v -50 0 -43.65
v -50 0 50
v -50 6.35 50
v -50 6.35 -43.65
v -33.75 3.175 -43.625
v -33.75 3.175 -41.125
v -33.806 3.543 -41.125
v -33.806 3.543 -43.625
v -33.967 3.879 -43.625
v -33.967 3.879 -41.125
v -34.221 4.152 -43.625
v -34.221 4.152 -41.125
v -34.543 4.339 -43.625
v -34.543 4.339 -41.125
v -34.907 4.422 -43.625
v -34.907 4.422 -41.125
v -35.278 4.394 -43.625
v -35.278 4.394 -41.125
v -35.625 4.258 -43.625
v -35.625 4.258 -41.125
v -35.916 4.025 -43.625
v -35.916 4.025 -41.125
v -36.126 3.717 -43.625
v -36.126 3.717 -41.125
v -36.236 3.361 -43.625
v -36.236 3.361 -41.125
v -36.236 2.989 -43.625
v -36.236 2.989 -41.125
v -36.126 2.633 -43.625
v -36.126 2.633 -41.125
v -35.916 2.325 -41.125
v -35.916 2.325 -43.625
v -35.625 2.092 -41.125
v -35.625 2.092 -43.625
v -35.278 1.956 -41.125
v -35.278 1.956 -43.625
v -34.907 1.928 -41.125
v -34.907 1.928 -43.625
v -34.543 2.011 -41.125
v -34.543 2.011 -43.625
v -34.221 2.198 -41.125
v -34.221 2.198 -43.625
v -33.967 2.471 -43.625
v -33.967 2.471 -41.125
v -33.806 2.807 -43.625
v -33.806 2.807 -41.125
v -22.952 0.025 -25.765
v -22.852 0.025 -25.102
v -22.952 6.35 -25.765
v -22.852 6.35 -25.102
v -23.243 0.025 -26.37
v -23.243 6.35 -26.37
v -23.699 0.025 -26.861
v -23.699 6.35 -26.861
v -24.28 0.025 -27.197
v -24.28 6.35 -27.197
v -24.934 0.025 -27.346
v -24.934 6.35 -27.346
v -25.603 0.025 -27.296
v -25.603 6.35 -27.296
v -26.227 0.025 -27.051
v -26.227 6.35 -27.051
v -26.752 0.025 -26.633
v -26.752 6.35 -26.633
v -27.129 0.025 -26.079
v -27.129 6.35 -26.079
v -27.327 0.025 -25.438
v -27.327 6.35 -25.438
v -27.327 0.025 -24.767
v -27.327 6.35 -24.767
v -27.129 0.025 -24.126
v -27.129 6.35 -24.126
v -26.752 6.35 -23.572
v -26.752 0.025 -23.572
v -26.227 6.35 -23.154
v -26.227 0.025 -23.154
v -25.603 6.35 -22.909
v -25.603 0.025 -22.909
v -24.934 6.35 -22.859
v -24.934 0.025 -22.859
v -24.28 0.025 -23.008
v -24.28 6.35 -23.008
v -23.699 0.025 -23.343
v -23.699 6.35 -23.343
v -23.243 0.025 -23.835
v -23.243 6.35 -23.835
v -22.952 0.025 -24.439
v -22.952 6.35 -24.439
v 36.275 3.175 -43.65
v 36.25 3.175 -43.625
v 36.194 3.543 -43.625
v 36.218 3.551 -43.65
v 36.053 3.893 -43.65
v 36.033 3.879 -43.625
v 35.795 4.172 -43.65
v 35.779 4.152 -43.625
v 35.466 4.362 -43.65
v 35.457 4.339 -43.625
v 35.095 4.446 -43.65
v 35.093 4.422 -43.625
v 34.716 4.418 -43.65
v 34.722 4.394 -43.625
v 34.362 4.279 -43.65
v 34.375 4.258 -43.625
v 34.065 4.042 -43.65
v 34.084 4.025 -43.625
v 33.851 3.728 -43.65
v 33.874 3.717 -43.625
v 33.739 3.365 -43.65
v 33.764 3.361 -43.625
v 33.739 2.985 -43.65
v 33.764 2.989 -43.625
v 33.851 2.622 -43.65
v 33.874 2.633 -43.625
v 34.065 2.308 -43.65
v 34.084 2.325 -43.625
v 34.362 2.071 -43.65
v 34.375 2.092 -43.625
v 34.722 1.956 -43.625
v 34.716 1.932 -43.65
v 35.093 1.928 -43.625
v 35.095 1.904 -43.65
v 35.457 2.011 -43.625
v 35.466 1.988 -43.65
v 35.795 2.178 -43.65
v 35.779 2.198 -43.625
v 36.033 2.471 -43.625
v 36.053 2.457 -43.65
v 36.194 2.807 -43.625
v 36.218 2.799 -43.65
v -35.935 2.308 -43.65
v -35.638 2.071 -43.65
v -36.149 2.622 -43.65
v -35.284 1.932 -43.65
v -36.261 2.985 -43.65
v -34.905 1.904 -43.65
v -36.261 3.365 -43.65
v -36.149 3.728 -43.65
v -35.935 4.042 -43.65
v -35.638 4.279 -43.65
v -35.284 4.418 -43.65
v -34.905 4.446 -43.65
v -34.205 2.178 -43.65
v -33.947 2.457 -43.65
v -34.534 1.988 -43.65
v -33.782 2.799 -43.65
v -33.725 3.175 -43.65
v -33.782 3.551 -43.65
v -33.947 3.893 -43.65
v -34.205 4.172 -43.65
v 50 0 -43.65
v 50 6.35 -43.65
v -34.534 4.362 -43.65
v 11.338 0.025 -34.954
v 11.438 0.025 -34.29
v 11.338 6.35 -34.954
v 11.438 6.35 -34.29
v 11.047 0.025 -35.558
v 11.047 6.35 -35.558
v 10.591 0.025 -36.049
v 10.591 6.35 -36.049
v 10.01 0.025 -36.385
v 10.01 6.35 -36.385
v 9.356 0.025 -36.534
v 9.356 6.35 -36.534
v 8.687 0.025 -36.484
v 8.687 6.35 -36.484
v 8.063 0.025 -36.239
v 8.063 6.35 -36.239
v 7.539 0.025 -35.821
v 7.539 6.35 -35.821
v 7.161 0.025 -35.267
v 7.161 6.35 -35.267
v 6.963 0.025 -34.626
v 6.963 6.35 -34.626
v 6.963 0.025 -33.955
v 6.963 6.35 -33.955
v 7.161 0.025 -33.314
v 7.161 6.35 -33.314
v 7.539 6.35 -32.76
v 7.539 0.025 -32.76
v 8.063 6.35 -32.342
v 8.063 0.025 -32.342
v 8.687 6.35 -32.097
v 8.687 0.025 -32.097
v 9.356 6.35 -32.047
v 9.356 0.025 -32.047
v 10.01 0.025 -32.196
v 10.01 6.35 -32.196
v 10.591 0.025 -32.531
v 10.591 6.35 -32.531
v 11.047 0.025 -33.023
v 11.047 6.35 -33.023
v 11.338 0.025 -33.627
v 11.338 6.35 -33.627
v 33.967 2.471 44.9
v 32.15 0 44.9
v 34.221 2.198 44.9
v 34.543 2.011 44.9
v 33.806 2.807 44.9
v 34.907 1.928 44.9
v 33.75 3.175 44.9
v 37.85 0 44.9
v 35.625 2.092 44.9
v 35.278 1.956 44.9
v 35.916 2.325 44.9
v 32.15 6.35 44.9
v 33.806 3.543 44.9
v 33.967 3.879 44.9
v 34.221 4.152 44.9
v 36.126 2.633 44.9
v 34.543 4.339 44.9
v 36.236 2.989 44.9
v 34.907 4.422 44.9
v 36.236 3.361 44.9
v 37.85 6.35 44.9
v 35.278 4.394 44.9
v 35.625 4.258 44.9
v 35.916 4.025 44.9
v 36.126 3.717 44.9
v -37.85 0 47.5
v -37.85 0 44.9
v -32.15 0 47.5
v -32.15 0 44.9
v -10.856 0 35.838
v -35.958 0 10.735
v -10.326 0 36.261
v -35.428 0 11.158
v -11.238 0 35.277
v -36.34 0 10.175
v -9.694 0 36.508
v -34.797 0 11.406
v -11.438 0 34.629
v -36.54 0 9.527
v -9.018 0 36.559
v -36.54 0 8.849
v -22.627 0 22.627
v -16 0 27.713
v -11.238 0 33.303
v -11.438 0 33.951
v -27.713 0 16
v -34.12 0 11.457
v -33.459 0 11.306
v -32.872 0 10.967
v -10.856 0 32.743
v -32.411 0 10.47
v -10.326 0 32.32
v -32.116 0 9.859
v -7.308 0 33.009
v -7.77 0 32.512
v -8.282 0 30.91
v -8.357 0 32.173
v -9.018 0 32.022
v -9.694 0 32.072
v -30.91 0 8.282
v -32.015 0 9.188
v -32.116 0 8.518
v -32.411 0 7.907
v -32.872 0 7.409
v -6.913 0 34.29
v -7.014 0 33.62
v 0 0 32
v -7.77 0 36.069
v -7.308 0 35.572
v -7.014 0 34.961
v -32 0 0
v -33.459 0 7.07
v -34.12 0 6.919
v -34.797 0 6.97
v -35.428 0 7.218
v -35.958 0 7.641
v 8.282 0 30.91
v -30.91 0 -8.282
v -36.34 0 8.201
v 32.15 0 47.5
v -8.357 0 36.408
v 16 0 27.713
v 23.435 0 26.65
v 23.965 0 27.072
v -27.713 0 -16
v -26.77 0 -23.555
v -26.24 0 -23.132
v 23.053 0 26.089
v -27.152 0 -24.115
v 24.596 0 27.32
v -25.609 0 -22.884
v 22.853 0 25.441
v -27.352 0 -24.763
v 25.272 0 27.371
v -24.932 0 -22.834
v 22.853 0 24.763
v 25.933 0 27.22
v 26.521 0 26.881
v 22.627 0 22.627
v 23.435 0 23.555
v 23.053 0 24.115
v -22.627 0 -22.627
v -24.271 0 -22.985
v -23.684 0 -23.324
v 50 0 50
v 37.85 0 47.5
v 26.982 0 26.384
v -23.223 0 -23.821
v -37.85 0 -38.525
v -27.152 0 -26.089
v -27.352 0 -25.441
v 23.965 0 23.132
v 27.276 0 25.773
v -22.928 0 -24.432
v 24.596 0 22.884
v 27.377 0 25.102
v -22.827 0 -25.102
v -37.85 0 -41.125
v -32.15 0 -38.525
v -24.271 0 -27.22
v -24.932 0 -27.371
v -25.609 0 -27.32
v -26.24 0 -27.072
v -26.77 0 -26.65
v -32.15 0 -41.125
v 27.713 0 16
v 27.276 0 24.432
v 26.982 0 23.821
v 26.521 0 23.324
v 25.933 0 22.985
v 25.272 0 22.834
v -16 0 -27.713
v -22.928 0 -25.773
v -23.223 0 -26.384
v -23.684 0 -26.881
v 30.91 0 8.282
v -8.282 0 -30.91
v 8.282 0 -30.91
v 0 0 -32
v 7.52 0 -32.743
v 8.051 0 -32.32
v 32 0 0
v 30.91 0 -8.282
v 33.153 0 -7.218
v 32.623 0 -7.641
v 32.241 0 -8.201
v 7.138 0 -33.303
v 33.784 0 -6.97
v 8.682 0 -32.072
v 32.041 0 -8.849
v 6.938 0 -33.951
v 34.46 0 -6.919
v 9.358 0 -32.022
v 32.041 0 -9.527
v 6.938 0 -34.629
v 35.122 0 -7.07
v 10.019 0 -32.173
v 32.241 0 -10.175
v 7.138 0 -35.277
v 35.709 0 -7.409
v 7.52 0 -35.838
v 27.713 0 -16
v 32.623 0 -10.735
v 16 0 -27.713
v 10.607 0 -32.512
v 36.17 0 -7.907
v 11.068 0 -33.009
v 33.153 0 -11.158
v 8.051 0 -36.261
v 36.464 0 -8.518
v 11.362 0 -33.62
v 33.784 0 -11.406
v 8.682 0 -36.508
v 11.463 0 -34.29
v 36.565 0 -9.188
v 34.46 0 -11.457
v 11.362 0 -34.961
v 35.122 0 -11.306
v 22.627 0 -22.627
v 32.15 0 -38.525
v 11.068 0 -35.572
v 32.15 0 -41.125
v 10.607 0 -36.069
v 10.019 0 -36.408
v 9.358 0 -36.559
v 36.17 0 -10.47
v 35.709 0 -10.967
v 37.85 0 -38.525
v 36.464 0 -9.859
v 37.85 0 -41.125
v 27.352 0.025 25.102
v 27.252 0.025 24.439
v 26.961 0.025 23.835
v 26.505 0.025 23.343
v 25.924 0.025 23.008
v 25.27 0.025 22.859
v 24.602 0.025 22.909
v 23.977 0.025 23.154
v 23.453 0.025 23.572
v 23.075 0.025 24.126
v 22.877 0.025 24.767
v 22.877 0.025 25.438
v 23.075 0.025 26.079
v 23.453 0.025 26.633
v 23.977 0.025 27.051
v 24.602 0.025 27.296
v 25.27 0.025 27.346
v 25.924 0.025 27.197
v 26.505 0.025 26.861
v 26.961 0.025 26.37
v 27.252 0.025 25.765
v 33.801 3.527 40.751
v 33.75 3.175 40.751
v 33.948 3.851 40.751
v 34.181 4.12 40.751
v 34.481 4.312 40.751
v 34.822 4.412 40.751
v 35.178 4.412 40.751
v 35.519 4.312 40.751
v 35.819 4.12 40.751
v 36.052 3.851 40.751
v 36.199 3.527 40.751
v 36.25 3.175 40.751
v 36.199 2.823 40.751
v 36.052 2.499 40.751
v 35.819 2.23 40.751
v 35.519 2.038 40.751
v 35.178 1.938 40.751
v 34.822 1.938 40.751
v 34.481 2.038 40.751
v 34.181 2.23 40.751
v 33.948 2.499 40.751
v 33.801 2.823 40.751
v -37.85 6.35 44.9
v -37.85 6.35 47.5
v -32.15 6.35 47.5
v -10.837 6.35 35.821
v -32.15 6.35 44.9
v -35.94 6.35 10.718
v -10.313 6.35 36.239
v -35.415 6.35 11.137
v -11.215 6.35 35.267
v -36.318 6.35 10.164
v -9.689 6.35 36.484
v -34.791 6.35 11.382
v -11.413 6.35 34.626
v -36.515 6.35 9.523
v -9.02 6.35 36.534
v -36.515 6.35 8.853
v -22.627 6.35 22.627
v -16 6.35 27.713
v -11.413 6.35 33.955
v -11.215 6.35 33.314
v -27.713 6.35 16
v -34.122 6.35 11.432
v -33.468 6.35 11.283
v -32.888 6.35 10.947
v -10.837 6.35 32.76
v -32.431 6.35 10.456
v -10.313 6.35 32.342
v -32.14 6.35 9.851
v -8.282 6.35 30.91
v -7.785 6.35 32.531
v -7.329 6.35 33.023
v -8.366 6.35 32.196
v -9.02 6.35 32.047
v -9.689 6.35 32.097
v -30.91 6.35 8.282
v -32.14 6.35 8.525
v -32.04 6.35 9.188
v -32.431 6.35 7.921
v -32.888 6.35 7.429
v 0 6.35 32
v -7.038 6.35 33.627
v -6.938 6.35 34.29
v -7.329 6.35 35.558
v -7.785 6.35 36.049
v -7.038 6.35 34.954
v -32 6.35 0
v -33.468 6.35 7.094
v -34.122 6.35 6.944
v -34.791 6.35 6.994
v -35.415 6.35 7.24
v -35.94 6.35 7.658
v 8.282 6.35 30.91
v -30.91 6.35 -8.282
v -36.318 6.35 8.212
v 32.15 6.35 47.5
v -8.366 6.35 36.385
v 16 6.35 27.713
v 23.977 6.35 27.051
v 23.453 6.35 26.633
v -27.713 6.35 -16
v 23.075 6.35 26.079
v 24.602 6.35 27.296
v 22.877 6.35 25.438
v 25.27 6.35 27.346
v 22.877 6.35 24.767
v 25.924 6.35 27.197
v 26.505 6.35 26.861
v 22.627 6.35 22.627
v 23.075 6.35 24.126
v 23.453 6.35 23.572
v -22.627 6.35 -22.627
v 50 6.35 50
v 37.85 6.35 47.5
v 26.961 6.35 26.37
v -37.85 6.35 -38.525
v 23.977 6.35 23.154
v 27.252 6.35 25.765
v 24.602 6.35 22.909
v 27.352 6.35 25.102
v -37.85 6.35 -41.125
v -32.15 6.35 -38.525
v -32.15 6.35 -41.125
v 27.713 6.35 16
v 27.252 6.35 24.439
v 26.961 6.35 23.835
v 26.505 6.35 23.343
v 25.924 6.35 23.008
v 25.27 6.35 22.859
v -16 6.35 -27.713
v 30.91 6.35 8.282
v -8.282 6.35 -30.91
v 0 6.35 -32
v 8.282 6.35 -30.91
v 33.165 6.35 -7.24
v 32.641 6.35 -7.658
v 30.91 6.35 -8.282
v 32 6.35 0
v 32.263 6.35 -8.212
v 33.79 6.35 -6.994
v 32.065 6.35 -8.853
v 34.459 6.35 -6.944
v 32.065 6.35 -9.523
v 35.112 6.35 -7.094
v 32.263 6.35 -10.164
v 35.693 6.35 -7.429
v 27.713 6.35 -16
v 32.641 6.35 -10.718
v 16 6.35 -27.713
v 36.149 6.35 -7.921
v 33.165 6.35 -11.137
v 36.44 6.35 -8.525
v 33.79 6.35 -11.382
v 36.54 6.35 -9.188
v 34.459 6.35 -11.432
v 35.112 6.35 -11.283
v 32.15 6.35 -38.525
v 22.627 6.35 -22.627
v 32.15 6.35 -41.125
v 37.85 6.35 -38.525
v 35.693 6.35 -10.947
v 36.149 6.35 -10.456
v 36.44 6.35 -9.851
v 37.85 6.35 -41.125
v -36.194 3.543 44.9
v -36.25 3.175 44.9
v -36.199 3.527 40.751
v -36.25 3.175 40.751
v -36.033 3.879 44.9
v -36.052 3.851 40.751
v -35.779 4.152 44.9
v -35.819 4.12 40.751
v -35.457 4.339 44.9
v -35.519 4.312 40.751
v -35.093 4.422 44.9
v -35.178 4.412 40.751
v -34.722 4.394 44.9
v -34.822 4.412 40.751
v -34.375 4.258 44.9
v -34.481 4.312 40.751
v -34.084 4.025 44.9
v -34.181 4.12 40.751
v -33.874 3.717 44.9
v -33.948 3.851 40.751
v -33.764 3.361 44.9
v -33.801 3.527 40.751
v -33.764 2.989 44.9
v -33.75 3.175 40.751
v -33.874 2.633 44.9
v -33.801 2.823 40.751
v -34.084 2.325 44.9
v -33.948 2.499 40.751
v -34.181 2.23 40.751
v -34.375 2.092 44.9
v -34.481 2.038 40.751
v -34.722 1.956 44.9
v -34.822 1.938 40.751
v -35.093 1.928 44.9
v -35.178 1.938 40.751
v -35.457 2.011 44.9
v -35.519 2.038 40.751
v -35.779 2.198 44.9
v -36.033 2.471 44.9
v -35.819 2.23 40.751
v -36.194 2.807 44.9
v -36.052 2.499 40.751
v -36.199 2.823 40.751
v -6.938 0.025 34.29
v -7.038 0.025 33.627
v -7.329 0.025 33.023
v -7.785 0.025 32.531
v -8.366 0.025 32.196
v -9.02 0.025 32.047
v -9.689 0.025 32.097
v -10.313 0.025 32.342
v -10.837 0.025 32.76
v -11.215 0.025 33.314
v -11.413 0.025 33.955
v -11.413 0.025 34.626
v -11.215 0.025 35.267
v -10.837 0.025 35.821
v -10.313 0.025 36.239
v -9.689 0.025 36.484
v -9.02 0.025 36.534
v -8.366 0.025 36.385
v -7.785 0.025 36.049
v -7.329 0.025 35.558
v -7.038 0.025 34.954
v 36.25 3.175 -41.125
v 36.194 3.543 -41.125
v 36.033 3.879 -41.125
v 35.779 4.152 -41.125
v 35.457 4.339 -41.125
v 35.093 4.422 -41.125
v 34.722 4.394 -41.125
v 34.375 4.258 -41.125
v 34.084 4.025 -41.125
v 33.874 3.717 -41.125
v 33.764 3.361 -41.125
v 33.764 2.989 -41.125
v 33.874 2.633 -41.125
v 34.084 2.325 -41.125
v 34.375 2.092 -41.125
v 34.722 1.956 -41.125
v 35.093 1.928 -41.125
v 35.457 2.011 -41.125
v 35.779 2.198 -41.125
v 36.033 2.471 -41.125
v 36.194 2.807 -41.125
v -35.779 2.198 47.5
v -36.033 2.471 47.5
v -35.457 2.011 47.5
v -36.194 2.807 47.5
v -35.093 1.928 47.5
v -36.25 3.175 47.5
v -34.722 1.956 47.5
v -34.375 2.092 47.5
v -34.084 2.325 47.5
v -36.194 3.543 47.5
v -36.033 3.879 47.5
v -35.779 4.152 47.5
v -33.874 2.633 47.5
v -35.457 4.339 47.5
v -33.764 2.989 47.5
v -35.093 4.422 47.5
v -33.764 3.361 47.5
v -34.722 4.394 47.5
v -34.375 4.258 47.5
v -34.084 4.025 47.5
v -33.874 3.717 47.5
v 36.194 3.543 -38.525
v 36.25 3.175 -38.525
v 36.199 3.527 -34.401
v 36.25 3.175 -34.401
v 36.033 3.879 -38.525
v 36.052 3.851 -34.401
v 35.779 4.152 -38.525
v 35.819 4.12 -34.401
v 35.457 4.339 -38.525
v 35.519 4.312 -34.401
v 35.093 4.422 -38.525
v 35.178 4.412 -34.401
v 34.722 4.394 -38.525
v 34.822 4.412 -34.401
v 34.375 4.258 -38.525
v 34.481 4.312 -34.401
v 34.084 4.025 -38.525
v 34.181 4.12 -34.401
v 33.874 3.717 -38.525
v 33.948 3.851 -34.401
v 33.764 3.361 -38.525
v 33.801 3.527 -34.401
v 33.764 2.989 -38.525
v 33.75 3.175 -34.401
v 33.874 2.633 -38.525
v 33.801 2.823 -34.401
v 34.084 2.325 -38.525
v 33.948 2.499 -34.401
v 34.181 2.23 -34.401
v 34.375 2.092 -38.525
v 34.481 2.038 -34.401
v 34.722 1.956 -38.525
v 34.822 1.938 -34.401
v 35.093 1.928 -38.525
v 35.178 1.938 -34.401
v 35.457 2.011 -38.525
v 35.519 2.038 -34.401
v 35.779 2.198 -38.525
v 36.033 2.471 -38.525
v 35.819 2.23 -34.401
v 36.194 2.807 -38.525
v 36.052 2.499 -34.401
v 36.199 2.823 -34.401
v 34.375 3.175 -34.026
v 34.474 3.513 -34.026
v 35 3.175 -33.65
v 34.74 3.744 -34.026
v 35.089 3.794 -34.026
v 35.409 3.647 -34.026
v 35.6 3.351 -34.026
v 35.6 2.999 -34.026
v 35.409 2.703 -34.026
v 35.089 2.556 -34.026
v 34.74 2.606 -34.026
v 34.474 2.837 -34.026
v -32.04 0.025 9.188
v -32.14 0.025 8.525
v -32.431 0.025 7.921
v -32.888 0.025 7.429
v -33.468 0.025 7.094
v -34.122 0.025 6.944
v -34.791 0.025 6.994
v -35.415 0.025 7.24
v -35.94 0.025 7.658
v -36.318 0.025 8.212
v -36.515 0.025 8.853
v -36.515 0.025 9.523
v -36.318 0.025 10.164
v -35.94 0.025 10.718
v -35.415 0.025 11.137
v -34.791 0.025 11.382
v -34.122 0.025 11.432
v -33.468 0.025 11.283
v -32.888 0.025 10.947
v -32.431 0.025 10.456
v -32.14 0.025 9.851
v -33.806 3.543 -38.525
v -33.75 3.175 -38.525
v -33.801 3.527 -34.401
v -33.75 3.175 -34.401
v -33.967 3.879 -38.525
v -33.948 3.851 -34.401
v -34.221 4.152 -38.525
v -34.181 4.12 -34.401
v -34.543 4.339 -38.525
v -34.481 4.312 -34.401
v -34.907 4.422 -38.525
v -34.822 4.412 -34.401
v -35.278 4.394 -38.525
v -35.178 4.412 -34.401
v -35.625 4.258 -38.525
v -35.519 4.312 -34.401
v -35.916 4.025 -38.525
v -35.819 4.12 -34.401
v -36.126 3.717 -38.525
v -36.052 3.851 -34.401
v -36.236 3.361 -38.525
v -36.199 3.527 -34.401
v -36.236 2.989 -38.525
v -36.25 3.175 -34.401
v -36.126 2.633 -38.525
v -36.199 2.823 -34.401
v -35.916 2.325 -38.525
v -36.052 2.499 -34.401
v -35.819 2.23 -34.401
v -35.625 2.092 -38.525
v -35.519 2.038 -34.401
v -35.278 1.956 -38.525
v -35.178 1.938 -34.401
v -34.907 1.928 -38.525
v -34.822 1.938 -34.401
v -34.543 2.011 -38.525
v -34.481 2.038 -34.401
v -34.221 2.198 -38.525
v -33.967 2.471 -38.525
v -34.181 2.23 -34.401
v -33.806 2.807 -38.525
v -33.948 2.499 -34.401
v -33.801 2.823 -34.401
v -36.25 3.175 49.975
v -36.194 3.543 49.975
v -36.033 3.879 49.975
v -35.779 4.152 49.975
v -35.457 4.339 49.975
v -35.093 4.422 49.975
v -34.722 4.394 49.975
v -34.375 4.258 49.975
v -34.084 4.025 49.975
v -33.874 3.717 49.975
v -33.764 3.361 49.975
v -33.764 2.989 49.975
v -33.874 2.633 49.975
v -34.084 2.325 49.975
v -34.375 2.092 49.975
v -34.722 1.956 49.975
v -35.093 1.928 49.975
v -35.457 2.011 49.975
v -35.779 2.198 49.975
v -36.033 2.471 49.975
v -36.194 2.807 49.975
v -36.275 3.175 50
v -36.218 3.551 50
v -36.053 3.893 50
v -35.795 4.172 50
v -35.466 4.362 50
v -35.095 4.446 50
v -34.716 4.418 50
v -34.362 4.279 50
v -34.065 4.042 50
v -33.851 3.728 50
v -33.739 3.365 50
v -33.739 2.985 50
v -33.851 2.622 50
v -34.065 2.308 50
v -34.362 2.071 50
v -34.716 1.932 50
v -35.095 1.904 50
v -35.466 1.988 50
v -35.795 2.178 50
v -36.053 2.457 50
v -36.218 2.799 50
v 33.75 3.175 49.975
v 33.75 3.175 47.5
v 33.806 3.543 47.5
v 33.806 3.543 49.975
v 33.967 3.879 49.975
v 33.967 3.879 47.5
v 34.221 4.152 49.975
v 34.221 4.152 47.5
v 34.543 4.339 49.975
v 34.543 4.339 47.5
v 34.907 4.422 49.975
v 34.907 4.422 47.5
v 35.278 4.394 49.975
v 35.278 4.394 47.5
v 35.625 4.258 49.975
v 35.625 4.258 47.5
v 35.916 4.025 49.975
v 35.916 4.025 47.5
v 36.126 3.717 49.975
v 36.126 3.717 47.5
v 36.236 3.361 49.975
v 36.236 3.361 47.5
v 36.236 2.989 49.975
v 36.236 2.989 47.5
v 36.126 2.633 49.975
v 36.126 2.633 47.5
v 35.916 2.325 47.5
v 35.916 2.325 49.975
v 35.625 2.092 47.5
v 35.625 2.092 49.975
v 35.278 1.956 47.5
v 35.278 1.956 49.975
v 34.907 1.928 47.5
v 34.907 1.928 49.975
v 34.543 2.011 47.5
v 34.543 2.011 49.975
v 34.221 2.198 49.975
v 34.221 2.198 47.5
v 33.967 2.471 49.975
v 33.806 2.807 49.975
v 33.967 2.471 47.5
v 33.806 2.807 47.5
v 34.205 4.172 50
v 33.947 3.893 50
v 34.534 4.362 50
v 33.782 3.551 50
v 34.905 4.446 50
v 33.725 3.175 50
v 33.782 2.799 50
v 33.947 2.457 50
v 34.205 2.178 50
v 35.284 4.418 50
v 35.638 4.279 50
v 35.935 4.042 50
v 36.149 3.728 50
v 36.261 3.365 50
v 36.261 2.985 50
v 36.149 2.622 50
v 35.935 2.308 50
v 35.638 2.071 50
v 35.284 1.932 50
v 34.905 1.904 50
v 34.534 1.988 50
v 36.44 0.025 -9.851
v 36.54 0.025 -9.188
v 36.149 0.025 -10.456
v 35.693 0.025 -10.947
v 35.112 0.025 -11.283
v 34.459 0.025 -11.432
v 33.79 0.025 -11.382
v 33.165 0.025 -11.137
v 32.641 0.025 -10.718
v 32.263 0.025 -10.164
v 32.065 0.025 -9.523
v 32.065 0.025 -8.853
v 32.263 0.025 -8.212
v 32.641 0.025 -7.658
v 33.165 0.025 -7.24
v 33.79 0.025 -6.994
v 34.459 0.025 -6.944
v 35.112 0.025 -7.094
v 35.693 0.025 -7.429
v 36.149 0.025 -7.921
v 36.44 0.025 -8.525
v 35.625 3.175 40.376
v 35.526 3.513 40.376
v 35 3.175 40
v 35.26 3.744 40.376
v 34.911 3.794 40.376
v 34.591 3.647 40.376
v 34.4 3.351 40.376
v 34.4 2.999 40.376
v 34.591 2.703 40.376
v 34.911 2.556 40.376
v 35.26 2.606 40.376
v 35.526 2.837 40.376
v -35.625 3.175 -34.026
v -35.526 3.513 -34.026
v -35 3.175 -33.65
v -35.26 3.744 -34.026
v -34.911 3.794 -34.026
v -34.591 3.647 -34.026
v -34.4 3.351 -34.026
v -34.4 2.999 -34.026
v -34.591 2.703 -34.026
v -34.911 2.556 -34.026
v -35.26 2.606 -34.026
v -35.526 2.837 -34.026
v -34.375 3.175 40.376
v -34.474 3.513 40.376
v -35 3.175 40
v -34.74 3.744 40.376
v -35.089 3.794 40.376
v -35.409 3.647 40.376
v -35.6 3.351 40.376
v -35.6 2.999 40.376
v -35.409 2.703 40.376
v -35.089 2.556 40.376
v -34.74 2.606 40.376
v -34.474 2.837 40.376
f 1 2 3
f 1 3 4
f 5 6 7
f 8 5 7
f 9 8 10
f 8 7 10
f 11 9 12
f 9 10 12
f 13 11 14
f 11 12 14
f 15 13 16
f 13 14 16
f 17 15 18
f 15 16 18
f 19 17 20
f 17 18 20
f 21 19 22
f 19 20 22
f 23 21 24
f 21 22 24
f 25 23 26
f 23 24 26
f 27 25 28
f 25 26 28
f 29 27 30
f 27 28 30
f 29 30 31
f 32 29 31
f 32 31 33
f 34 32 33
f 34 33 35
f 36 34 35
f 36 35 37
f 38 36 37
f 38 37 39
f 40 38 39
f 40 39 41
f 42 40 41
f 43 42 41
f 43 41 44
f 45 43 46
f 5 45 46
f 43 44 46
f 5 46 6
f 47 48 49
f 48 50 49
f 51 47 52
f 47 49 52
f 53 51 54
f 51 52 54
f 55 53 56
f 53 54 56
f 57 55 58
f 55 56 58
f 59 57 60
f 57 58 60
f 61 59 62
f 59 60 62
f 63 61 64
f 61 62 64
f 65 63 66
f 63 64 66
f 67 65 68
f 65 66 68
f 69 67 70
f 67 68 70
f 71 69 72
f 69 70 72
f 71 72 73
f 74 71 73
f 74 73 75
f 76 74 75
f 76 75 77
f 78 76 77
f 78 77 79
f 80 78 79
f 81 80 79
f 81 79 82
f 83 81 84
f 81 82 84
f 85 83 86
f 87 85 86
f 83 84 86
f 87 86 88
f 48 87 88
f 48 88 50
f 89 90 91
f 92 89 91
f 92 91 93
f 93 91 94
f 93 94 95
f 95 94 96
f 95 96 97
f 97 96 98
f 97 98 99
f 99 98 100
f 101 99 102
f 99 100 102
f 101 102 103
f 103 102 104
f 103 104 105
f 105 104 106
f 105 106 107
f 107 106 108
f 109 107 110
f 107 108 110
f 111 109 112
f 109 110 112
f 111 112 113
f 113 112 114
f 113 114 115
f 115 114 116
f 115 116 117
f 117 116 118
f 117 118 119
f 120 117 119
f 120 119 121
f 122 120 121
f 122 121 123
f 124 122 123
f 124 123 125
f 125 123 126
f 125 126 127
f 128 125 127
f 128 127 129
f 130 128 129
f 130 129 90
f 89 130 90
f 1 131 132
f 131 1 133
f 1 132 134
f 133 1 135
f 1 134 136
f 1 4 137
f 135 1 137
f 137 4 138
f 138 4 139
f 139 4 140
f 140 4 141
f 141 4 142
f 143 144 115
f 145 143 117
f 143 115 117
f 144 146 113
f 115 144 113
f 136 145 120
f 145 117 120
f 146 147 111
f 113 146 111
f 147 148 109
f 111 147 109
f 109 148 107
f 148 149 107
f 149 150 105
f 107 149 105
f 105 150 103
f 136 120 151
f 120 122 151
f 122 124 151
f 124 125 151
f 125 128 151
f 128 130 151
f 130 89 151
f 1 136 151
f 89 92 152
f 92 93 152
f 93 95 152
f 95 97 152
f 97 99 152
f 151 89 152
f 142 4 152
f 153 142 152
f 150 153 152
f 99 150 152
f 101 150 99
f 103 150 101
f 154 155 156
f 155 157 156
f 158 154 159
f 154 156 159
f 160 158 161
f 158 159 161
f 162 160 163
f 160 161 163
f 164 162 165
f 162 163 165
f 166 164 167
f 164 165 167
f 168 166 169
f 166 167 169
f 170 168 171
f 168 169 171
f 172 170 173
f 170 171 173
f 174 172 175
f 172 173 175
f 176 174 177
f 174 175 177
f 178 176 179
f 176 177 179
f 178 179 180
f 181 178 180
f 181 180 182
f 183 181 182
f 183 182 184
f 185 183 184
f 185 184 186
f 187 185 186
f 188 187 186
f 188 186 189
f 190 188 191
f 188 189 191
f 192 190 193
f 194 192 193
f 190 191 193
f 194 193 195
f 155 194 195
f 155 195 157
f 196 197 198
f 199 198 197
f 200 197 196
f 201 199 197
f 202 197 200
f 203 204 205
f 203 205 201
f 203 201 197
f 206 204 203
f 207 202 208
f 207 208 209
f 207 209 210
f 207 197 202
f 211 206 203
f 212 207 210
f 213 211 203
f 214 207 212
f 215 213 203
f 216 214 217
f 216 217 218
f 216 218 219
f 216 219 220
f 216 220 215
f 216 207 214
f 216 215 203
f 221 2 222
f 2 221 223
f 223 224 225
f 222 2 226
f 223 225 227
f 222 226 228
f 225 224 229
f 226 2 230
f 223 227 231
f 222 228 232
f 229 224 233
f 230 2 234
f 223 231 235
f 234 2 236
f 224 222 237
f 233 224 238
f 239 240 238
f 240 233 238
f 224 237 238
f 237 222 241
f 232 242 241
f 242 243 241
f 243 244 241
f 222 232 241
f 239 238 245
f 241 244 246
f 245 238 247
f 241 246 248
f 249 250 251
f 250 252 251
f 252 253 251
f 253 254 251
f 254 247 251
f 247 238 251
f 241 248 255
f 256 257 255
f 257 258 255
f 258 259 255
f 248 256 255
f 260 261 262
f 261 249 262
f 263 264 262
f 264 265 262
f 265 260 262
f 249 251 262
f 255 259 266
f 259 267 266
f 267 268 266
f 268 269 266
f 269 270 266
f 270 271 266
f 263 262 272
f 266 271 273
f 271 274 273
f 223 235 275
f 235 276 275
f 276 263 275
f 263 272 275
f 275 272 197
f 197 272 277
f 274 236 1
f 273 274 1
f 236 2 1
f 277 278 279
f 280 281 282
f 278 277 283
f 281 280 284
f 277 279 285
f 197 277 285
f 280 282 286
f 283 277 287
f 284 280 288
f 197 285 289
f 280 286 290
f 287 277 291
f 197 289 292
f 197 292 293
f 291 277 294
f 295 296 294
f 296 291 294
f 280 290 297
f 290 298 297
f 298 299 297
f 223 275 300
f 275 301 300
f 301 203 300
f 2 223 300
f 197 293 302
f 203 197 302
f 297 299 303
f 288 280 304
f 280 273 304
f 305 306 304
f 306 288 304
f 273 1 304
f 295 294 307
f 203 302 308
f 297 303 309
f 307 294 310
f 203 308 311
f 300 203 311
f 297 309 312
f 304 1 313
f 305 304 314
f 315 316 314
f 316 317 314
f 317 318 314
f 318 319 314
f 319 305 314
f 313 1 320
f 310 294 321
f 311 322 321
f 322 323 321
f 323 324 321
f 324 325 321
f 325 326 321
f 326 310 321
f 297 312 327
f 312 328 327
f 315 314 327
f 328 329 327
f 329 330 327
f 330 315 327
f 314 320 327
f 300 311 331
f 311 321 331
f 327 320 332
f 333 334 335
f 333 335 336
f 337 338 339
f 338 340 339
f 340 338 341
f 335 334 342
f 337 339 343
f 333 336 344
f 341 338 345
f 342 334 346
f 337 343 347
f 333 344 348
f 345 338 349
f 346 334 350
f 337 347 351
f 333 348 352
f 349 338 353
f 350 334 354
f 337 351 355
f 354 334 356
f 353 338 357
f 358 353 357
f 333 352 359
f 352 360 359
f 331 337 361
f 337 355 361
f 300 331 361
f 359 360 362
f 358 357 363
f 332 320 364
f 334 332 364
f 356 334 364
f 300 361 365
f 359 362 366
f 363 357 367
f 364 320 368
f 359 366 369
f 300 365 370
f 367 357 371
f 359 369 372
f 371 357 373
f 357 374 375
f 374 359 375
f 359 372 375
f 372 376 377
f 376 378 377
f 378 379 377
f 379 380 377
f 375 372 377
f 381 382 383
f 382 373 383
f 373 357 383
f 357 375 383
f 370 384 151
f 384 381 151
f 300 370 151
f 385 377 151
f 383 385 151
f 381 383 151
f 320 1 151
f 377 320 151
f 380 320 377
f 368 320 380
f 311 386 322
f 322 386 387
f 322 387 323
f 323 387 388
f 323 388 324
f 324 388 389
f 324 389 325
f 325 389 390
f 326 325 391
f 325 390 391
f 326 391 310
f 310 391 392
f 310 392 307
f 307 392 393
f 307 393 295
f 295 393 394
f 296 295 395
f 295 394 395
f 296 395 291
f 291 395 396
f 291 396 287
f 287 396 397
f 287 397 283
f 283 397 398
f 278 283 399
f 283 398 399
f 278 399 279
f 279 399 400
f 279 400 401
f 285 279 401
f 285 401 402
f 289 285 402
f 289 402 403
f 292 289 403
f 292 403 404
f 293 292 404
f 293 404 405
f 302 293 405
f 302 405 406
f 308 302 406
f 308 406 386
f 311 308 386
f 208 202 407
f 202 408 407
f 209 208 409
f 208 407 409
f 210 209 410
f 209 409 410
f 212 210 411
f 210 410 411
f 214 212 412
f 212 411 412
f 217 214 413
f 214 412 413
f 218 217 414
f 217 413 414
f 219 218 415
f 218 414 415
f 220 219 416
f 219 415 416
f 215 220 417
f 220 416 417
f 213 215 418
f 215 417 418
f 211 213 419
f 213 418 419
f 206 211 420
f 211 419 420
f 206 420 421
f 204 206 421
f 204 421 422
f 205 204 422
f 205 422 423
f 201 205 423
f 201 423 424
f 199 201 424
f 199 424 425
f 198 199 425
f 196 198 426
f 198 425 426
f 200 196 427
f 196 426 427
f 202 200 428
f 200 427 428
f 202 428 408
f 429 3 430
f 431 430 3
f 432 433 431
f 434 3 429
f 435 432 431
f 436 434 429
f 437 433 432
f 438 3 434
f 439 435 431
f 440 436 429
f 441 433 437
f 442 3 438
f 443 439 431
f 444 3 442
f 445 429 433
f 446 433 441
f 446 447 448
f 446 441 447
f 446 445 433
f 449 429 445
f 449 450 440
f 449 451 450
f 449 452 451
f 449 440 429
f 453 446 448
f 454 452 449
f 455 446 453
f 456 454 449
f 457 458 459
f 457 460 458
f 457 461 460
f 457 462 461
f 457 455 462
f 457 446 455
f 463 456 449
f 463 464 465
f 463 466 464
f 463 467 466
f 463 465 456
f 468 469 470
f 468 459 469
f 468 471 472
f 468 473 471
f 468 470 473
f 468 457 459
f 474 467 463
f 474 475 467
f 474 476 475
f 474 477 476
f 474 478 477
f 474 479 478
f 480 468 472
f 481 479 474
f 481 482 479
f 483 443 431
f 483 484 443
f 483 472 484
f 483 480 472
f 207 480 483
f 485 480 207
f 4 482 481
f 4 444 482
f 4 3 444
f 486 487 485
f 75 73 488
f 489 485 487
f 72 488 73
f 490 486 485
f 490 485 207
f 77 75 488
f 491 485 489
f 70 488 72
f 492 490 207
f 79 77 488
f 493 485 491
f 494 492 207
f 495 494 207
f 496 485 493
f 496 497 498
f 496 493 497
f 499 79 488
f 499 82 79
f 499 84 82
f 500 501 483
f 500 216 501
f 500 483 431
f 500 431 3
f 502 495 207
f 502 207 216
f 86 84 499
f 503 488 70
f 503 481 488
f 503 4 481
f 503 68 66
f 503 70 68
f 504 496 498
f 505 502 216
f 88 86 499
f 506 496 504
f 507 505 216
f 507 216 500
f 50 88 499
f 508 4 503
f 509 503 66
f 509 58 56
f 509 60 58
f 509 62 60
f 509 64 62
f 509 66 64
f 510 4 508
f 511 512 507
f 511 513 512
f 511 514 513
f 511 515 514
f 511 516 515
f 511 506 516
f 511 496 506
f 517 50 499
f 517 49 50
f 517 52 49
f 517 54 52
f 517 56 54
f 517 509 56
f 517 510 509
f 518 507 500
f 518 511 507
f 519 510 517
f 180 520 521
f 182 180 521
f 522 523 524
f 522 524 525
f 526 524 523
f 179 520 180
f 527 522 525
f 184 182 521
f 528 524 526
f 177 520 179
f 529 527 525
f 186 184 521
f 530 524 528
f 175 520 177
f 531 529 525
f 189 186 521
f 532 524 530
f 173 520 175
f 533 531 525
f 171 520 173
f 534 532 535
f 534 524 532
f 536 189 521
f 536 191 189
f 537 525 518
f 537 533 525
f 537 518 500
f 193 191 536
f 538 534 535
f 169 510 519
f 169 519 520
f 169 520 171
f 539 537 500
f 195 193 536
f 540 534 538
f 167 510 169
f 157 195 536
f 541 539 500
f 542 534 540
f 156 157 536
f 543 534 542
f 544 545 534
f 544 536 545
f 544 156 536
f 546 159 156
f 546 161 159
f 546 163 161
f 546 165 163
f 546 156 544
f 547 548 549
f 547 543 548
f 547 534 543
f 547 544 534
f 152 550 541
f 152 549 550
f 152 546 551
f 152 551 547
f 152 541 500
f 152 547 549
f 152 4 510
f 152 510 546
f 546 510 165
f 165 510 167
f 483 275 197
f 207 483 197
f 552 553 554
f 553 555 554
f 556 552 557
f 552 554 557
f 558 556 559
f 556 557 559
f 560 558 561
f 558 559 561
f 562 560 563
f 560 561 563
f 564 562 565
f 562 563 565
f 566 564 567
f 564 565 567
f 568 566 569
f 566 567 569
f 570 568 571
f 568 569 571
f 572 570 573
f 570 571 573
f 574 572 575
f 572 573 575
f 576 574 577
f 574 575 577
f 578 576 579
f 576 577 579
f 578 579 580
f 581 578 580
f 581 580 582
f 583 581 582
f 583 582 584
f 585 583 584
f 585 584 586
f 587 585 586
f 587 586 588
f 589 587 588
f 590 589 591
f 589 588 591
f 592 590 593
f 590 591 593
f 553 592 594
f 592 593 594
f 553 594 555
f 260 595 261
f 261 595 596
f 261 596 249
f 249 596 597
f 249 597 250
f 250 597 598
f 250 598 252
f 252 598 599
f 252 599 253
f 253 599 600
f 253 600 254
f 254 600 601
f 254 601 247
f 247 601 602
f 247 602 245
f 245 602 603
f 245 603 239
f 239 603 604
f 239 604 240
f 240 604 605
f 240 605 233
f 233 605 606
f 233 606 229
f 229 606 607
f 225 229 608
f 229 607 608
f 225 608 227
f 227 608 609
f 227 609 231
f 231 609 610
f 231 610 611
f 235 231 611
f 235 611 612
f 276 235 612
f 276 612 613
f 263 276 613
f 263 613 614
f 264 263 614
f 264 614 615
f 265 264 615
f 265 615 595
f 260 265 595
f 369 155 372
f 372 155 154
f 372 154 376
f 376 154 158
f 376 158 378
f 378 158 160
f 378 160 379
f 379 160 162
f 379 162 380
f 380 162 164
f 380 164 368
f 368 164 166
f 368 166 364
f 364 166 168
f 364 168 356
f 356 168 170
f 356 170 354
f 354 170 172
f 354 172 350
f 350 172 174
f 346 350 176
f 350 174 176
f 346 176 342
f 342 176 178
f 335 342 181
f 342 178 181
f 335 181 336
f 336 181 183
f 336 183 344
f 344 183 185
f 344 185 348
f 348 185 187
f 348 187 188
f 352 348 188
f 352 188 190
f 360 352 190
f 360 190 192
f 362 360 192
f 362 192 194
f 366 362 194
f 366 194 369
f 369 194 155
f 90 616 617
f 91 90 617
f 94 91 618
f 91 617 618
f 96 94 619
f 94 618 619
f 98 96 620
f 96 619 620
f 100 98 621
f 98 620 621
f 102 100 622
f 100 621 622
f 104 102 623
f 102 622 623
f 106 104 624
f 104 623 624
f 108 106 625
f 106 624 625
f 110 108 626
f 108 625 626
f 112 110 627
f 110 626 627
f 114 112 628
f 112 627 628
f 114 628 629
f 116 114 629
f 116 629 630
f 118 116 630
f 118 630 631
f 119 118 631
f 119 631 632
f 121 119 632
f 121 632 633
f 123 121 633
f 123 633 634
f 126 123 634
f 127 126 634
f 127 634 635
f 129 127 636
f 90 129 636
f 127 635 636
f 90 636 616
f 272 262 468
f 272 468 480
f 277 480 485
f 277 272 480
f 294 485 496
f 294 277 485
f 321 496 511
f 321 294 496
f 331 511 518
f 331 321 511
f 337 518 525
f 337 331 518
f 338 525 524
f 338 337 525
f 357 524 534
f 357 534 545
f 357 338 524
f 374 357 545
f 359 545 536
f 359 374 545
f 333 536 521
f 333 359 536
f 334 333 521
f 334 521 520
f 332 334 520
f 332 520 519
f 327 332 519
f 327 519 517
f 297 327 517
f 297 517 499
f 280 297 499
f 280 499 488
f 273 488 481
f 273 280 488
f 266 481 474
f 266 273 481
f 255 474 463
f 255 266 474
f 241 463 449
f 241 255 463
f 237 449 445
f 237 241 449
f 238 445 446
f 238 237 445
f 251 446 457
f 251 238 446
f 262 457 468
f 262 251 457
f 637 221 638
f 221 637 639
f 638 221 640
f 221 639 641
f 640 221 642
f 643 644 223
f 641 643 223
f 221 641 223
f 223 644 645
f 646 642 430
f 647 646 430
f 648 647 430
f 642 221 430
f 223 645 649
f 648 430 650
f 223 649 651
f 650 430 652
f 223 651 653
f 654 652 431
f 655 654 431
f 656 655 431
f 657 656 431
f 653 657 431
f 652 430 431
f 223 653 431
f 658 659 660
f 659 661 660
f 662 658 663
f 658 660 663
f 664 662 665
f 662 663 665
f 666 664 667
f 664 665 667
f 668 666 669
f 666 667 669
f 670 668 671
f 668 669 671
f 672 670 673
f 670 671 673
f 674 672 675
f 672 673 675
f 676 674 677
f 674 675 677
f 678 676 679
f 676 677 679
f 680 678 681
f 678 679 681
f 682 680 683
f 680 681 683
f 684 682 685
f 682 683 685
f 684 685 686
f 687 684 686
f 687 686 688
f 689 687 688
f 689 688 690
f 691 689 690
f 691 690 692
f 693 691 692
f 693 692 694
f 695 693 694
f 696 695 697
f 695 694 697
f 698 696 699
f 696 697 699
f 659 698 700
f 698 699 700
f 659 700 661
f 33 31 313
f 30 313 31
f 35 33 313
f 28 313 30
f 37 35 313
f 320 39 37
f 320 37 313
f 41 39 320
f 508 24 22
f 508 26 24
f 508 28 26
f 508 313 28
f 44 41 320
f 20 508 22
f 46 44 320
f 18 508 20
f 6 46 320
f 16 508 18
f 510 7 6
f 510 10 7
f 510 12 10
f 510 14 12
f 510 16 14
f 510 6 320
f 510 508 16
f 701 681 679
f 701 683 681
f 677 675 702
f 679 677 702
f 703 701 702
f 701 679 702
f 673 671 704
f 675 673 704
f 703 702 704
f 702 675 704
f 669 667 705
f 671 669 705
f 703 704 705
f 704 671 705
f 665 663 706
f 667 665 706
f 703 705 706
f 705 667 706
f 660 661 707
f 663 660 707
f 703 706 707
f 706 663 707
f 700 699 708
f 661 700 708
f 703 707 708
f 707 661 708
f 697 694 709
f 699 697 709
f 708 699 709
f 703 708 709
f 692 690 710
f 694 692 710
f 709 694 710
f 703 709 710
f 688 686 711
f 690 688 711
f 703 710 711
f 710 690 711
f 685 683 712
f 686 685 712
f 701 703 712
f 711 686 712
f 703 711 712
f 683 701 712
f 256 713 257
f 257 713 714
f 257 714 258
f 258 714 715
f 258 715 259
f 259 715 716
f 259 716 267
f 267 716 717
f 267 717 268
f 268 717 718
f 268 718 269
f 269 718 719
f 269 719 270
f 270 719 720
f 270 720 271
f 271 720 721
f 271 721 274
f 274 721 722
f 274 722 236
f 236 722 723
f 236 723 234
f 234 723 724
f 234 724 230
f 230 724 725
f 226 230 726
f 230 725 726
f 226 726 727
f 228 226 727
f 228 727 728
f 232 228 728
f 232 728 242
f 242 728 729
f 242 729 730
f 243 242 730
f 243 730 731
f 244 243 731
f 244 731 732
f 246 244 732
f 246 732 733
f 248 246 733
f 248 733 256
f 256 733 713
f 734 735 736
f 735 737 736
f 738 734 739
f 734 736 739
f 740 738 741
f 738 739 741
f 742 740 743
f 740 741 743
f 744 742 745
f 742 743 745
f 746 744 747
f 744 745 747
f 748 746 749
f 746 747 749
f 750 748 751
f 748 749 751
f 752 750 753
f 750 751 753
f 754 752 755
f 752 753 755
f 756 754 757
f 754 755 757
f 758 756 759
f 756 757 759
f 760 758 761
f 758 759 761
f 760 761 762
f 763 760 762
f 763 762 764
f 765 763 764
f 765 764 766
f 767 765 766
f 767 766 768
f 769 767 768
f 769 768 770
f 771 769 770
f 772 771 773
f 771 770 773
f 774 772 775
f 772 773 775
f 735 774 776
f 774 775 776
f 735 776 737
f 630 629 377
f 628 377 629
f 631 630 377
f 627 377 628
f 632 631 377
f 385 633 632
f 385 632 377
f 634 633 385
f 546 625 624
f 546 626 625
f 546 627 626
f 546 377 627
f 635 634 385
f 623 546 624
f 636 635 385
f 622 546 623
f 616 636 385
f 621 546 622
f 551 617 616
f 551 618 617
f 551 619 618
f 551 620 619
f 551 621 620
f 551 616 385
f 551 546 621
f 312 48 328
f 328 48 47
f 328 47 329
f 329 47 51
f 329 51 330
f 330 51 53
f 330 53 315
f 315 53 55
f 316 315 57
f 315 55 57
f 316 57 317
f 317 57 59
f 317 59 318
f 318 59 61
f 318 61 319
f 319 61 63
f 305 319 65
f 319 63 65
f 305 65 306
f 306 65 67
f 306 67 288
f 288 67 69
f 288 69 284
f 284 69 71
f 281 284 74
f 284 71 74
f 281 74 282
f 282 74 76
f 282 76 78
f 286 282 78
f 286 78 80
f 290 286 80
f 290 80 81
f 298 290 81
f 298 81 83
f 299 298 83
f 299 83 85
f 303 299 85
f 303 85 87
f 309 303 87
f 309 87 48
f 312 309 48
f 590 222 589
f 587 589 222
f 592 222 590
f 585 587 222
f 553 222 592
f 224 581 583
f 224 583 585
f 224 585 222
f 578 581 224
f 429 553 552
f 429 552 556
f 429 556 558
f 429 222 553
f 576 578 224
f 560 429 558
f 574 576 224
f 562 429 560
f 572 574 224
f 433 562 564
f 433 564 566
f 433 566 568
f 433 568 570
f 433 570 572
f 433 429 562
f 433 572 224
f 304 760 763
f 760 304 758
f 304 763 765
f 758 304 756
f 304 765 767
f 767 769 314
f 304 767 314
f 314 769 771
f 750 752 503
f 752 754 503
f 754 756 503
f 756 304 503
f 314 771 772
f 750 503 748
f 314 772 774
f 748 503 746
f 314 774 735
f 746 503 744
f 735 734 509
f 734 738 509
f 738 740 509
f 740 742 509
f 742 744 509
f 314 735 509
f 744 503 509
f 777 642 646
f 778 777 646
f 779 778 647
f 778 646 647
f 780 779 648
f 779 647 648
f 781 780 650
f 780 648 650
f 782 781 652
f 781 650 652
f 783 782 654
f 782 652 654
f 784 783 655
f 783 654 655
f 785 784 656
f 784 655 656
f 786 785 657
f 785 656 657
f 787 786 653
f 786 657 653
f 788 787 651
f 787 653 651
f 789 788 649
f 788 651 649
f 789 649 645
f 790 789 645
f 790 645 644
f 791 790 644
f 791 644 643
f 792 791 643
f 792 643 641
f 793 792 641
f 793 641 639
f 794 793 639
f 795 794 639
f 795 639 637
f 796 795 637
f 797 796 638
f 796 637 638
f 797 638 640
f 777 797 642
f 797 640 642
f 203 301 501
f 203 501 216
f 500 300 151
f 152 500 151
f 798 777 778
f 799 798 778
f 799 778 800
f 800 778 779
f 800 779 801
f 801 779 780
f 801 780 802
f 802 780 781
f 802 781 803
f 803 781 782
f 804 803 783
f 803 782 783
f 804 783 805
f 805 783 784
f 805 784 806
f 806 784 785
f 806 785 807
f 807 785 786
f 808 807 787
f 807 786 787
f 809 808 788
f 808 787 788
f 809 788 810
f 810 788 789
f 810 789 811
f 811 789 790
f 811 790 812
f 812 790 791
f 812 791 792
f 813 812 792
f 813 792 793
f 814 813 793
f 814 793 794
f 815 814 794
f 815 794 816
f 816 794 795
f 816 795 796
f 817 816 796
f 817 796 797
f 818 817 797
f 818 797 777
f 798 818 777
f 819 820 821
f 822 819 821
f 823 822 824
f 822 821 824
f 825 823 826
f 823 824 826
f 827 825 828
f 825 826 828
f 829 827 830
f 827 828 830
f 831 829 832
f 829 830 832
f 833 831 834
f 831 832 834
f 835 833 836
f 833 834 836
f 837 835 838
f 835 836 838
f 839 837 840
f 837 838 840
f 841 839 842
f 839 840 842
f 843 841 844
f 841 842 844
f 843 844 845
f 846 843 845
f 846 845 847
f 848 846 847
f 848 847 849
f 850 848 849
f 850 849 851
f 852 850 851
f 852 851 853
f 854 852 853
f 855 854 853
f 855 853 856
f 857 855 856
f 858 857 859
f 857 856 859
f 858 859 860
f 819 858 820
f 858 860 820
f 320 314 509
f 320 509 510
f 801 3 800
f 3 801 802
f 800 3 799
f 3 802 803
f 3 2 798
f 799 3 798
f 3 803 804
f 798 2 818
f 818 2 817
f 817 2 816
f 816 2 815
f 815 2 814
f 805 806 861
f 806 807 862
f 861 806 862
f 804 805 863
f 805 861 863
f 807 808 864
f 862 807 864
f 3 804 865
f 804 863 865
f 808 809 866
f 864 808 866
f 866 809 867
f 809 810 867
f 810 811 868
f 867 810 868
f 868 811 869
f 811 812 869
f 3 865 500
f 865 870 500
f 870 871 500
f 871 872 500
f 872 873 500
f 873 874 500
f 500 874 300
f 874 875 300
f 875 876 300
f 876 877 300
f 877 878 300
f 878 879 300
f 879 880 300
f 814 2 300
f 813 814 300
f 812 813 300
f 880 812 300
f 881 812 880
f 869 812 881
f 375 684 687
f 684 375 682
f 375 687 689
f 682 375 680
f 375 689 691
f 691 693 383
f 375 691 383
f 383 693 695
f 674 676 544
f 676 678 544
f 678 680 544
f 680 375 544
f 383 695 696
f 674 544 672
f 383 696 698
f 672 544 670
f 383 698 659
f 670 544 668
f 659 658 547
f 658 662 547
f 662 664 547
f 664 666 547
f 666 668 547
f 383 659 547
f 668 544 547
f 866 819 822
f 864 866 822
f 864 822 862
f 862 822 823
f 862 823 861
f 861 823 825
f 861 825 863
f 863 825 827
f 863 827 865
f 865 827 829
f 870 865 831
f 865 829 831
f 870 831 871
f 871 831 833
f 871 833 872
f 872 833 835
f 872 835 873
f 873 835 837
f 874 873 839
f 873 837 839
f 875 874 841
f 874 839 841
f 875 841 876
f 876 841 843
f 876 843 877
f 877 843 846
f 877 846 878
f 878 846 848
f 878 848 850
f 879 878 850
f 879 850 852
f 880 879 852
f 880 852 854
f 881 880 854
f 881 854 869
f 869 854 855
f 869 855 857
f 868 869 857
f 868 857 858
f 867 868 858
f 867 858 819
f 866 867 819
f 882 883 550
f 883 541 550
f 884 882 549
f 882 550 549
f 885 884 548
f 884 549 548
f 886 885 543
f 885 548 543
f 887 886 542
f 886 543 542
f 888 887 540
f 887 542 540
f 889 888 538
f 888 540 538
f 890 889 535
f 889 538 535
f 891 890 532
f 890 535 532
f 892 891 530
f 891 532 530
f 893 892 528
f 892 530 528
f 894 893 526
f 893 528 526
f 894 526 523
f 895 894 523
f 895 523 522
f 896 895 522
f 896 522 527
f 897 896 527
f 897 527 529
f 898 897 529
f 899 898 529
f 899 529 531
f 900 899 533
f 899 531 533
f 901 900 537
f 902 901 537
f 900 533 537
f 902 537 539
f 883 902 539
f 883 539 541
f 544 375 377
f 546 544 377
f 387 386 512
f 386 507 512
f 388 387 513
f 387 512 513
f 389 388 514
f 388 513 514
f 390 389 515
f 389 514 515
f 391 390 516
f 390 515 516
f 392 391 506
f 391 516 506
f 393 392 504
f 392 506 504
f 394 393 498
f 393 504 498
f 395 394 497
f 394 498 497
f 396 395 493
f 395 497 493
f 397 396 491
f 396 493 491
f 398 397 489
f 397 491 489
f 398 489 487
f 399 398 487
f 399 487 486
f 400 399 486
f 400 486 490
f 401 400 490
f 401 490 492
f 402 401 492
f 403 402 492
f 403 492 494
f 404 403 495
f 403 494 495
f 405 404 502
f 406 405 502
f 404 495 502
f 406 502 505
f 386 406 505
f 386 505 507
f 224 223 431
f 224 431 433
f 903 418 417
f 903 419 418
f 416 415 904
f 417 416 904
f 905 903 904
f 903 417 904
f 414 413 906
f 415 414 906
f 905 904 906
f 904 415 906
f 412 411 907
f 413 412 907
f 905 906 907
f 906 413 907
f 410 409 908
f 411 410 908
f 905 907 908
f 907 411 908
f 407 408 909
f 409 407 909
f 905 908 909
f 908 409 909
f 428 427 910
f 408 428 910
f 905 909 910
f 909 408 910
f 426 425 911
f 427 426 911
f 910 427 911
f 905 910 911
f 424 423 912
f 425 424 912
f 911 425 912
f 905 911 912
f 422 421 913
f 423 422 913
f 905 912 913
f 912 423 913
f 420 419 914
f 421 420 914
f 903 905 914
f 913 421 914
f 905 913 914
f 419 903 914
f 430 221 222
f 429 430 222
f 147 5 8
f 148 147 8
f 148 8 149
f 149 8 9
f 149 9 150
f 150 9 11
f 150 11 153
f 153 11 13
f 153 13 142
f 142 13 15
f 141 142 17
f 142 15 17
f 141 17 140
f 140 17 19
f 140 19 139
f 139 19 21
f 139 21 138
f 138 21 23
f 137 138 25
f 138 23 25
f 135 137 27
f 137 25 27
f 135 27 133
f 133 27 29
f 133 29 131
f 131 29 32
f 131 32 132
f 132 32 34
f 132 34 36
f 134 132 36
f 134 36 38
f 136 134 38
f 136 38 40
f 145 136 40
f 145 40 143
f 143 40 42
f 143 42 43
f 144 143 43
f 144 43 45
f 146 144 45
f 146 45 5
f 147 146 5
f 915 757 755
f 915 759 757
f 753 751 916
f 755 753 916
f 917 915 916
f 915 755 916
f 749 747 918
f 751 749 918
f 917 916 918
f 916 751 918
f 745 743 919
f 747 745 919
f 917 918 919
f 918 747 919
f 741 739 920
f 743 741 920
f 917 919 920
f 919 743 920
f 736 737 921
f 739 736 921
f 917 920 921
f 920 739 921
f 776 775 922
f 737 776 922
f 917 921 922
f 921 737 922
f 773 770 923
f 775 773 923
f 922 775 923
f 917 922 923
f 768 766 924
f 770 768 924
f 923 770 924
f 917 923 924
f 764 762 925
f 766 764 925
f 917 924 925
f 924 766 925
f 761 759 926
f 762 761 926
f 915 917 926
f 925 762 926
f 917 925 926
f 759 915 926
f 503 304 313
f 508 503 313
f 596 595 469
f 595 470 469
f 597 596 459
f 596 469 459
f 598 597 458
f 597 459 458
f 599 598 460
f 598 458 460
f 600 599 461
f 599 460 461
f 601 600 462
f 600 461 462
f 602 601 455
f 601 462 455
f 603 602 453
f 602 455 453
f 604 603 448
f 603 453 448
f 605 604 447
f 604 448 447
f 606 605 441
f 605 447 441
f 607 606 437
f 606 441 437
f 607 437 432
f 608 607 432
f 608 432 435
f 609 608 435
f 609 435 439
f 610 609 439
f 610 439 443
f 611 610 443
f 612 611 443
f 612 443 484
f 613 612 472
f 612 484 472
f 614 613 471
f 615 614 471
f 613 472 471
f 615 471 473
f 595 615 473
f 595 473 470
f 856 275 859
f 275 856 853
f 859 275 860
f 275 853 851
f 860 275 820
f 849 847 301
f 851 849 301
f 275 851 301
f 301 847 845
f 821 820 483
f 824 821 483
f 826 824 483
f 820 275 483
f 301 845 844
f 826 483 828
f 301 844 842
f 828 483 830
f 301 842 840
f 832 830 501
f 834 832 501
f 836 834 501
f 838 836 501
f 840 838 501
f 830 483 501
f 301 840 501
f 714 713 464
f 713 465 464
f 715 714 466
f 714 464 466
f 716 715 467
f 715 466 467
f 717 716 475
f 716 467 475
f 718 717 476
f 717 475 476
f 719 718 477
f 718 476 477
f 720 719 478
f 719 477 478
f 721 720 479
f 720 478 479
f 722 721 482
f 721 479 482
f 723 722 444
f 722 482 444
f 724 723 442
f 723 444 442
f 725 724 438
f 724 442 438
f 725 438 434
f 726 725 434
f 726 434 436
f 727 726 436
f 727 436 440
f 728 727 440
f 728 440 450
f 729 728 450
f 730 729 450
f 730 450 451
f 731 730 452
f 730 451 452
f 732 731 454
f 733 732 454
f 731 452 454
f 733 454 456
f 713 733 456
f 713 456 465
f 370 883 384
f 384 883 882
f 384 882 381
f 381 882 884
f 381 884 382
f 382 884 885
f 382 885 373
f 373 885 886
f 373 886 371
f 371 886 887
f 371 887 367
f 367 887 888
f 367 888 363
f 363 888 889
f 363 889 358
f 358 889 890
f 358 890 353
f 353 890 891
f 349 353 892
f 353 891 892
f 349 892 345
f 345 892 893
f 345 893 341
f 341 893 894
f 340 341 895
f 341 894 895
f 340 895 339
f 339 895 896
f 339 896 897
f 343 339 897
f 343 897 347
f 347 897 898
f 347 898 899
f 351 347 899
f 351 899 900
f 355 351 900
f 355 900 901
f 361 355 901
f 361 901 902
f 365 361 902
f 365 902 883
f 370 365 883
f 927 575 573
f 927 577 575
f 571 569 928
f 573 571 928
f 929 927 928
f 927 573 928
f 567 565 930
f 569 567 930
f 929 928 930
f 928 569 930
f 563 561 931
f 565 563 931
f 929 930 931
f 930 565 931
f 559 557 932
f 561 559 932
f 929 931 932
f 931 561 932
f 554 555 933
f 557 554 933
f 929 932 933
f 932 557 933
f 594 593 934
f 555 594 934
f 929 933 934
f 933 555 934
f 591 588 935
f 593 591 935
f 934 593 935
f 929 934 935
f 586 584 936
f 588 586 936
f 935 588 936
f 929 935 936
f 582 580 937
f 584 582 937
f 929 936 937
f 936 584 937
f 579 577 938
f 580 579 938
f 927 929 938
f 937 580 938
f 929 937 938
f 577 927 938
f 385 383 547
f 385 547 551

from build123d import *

# Parameters (mm, degrees)
SKETCH1_W                             = 100
SKETCH1_H                             = 100
SKETCH1_R                             = 32
BOSS_EXTRUDE3_DEPTH                   = 6.35
M4_CLEARANCE_HOLE2_D                  = 4.5
M4_CLEARANCE_HOLE2_CSINK_D            = 4.55
M4_CLEARANCE_HOLE2_CSINK_ANGLE        = 90
TAP_DRILL_FOR_M3X0_5_TAP2_D           = 2.5
TAP_DRILL_FOR_M3X0_5_TAP2_DEPTH       = 9.248924226
TAP_DRILL_FOR_M3X0_5_TAP2_CSINK_D     = 2.55
TAP_DRILL_FOR_M3X0_5_TAP2_CSINK_ANGLE = 90
TAP_DRILL_FOR_M3X0_5_TAP2_TIP         = 0.751075774
SKETCH32_W                            = 100
SKETCH32_H                            = 6.35
CUT_EXTRUDE1_DEPTH                    = 10
TAP_DRILL_FOR_M3X0_5_TAP4_D           = 2.5
TAP_DRILL_FOR_M3X0_5_TAP4_DEPTH       = 9.248924226
TAP_DRILL_FOR_M3X0_5_TAP4_CSINK_D     = 2.55
TAP_DRILL_FOR_M3X0_5_TAP4_CSINK_ANGLE = 90
TAP_DRILL_FOR_M3X0_5_TAP4_TIP         = 0.751075774
SKETCH36_W                            = 5.7
SKETCH36_H                            = 2.6
CUT_EXTRUDE2_DEPTH                    = 71.995228713


with BuildPart() as part:
    # Sketch1 → Boss-Extrude3 (new body)
    with BuildSketch(Plane(origin=(0, 0, 0), x_dir=(1, 0, 0), z_dir=(0, 1, 0))):
        Rectangle(SKETCH1_W, SKETCH1_H)
        with Locations(Location((0, 0, 0), (0, 0, 270))):
            Circle(SKETCH1_R, mode=Mode.SUBTRACT)
    extrude(amount=BOSS_EXTRUDE3_DEPTH)

    # M4 Clearance Hole2 (through all)
    with Locations(Plane(origin=(0, 0, 0), x_dir=(-1, 0, 0), z_dir=(0, -1, 0))):
        with Locations((-9.188076101, 34.290366833), (25.102290732, 25.102290732), (34.290366833, -9.188076101), (9.188076101, -34.290366833), (-25.102290732, -25.102290732), (-34.290366833, 9.188076101)):
            CounterSinkHole(M4_CLEARANCE_HOLE2_D / 2, M4_CLEARANCE_HOLE2_CSINK_D / 2, counter_sink_angle=M4_CLEARANCE_HOLE2_CSINK_ANGLE)

    # Tap Drill for M3x0.5 Tap2
    with Locations(Plane.XY.offset(50)):
        with Locations((-35, 3.175), (35, 3.175)):
            CounterSinkHole(TAP_DRILL_FOR_M3X0_5_TAP2_D / 2, TAP_DRILL_FOR_M3X0_5_TAP2_CSINK_D / 2, depth=TAP_DRILL_FOR_M3X0_5_TAP2_DEPTH, counter_sink_angle=TAP_DRILL_FOR_M3X0_5_TAP2_CSINK_ANGLE)
            with Locations((0, 0, -(TAP_DRILL_FOR_M3X0_5_TAP2_DEPTH + TAP_DRILL_FOR_M3X0_5_TAP2_TIP / 2))):  # 118° drill point
                Cone(0, TAP_DRILL_FOR_M3X0_5_TAP2_D / 2, TAP_DRILL_FOR_M3X0_5_TAP2_TIP, mode=Mode.SUBTRACT)

    # Sketch32 → Cut-Extrude1 (cut)
    with BuildSketch(Plane(origin=(0, 6.35, 0), x_dir=(1, 0, 0), z_dir=(0, 1, 0))):
        with Locations((0, 46.825)):
            Rectangle(SKETCH32_W, SKETCH32_H)
    extrude(amount=-CUT_EXTRUDE1_DEPTH, mode=Mode.SUBTRACT)

    # Tap Drill for M3x0.5 Tap4
    with Locations(Plane(origin=(0, 0, -43.65), x_dir=(-1, 0, 0), z_dir=(0, 0, -1))):
        with Locations((-35, 3.175), (35, 3.175)):
            CounterSinkHole(TAP_DRILL_FOR_M3X0_5_TAP4_D / 2, TAP_DRILL_FOR_M3X0_5_TAP4_CSINK_D / 2, depth=TAP_DRILL_FOR_M3X0_5_TAP4_DEPTH, counter_sink_angle=TAP_DRILL_FOR_M3X0_5_TAP4_CSINK_ANGLE)
            with Locations((0, 0, -(TAP_DRILL_FOR_M3X0_5_TAP4_DEPTH + TAP_DRILL_FOR_M3X0_5_TAP4_TIP / 2))):  # 118° drill point
                Cone(0, TAP_DRILL_FOR_M3X0_5_TAP4_D / 2, TAP_DRILL_FOR_M3X0_5_TAP4_TIP, mode=Mode.SUBTRACT)

    # Sketch36 → Cut-Extrude2 (cut, through all)
    with BuildSketch(Plane(origin=(0, 6.35, 0), x_dir=(1, 0, 0), z_dir=(0, 1, 0))):
        with Locations((-35, -46.2)):
            Rectangle(SKETCH36_W, SKETCH36_H)
        with Locations((35, -46.2)):
            Rectangle(SKETCH36_W, SKETCH36_H)
        with Locations((35, 39.825)):
            Rectangle(SKETCH36_W, SKETCH36_H)
        with Locations((-35, 39.825)):
            Rectangle(SKETCH36_W, SKETCH36_H)
    extrude(amount=-CUT_EXTRUDE2_DEPTH, mode=Mode.SUBTRACT)


solid = part.part
